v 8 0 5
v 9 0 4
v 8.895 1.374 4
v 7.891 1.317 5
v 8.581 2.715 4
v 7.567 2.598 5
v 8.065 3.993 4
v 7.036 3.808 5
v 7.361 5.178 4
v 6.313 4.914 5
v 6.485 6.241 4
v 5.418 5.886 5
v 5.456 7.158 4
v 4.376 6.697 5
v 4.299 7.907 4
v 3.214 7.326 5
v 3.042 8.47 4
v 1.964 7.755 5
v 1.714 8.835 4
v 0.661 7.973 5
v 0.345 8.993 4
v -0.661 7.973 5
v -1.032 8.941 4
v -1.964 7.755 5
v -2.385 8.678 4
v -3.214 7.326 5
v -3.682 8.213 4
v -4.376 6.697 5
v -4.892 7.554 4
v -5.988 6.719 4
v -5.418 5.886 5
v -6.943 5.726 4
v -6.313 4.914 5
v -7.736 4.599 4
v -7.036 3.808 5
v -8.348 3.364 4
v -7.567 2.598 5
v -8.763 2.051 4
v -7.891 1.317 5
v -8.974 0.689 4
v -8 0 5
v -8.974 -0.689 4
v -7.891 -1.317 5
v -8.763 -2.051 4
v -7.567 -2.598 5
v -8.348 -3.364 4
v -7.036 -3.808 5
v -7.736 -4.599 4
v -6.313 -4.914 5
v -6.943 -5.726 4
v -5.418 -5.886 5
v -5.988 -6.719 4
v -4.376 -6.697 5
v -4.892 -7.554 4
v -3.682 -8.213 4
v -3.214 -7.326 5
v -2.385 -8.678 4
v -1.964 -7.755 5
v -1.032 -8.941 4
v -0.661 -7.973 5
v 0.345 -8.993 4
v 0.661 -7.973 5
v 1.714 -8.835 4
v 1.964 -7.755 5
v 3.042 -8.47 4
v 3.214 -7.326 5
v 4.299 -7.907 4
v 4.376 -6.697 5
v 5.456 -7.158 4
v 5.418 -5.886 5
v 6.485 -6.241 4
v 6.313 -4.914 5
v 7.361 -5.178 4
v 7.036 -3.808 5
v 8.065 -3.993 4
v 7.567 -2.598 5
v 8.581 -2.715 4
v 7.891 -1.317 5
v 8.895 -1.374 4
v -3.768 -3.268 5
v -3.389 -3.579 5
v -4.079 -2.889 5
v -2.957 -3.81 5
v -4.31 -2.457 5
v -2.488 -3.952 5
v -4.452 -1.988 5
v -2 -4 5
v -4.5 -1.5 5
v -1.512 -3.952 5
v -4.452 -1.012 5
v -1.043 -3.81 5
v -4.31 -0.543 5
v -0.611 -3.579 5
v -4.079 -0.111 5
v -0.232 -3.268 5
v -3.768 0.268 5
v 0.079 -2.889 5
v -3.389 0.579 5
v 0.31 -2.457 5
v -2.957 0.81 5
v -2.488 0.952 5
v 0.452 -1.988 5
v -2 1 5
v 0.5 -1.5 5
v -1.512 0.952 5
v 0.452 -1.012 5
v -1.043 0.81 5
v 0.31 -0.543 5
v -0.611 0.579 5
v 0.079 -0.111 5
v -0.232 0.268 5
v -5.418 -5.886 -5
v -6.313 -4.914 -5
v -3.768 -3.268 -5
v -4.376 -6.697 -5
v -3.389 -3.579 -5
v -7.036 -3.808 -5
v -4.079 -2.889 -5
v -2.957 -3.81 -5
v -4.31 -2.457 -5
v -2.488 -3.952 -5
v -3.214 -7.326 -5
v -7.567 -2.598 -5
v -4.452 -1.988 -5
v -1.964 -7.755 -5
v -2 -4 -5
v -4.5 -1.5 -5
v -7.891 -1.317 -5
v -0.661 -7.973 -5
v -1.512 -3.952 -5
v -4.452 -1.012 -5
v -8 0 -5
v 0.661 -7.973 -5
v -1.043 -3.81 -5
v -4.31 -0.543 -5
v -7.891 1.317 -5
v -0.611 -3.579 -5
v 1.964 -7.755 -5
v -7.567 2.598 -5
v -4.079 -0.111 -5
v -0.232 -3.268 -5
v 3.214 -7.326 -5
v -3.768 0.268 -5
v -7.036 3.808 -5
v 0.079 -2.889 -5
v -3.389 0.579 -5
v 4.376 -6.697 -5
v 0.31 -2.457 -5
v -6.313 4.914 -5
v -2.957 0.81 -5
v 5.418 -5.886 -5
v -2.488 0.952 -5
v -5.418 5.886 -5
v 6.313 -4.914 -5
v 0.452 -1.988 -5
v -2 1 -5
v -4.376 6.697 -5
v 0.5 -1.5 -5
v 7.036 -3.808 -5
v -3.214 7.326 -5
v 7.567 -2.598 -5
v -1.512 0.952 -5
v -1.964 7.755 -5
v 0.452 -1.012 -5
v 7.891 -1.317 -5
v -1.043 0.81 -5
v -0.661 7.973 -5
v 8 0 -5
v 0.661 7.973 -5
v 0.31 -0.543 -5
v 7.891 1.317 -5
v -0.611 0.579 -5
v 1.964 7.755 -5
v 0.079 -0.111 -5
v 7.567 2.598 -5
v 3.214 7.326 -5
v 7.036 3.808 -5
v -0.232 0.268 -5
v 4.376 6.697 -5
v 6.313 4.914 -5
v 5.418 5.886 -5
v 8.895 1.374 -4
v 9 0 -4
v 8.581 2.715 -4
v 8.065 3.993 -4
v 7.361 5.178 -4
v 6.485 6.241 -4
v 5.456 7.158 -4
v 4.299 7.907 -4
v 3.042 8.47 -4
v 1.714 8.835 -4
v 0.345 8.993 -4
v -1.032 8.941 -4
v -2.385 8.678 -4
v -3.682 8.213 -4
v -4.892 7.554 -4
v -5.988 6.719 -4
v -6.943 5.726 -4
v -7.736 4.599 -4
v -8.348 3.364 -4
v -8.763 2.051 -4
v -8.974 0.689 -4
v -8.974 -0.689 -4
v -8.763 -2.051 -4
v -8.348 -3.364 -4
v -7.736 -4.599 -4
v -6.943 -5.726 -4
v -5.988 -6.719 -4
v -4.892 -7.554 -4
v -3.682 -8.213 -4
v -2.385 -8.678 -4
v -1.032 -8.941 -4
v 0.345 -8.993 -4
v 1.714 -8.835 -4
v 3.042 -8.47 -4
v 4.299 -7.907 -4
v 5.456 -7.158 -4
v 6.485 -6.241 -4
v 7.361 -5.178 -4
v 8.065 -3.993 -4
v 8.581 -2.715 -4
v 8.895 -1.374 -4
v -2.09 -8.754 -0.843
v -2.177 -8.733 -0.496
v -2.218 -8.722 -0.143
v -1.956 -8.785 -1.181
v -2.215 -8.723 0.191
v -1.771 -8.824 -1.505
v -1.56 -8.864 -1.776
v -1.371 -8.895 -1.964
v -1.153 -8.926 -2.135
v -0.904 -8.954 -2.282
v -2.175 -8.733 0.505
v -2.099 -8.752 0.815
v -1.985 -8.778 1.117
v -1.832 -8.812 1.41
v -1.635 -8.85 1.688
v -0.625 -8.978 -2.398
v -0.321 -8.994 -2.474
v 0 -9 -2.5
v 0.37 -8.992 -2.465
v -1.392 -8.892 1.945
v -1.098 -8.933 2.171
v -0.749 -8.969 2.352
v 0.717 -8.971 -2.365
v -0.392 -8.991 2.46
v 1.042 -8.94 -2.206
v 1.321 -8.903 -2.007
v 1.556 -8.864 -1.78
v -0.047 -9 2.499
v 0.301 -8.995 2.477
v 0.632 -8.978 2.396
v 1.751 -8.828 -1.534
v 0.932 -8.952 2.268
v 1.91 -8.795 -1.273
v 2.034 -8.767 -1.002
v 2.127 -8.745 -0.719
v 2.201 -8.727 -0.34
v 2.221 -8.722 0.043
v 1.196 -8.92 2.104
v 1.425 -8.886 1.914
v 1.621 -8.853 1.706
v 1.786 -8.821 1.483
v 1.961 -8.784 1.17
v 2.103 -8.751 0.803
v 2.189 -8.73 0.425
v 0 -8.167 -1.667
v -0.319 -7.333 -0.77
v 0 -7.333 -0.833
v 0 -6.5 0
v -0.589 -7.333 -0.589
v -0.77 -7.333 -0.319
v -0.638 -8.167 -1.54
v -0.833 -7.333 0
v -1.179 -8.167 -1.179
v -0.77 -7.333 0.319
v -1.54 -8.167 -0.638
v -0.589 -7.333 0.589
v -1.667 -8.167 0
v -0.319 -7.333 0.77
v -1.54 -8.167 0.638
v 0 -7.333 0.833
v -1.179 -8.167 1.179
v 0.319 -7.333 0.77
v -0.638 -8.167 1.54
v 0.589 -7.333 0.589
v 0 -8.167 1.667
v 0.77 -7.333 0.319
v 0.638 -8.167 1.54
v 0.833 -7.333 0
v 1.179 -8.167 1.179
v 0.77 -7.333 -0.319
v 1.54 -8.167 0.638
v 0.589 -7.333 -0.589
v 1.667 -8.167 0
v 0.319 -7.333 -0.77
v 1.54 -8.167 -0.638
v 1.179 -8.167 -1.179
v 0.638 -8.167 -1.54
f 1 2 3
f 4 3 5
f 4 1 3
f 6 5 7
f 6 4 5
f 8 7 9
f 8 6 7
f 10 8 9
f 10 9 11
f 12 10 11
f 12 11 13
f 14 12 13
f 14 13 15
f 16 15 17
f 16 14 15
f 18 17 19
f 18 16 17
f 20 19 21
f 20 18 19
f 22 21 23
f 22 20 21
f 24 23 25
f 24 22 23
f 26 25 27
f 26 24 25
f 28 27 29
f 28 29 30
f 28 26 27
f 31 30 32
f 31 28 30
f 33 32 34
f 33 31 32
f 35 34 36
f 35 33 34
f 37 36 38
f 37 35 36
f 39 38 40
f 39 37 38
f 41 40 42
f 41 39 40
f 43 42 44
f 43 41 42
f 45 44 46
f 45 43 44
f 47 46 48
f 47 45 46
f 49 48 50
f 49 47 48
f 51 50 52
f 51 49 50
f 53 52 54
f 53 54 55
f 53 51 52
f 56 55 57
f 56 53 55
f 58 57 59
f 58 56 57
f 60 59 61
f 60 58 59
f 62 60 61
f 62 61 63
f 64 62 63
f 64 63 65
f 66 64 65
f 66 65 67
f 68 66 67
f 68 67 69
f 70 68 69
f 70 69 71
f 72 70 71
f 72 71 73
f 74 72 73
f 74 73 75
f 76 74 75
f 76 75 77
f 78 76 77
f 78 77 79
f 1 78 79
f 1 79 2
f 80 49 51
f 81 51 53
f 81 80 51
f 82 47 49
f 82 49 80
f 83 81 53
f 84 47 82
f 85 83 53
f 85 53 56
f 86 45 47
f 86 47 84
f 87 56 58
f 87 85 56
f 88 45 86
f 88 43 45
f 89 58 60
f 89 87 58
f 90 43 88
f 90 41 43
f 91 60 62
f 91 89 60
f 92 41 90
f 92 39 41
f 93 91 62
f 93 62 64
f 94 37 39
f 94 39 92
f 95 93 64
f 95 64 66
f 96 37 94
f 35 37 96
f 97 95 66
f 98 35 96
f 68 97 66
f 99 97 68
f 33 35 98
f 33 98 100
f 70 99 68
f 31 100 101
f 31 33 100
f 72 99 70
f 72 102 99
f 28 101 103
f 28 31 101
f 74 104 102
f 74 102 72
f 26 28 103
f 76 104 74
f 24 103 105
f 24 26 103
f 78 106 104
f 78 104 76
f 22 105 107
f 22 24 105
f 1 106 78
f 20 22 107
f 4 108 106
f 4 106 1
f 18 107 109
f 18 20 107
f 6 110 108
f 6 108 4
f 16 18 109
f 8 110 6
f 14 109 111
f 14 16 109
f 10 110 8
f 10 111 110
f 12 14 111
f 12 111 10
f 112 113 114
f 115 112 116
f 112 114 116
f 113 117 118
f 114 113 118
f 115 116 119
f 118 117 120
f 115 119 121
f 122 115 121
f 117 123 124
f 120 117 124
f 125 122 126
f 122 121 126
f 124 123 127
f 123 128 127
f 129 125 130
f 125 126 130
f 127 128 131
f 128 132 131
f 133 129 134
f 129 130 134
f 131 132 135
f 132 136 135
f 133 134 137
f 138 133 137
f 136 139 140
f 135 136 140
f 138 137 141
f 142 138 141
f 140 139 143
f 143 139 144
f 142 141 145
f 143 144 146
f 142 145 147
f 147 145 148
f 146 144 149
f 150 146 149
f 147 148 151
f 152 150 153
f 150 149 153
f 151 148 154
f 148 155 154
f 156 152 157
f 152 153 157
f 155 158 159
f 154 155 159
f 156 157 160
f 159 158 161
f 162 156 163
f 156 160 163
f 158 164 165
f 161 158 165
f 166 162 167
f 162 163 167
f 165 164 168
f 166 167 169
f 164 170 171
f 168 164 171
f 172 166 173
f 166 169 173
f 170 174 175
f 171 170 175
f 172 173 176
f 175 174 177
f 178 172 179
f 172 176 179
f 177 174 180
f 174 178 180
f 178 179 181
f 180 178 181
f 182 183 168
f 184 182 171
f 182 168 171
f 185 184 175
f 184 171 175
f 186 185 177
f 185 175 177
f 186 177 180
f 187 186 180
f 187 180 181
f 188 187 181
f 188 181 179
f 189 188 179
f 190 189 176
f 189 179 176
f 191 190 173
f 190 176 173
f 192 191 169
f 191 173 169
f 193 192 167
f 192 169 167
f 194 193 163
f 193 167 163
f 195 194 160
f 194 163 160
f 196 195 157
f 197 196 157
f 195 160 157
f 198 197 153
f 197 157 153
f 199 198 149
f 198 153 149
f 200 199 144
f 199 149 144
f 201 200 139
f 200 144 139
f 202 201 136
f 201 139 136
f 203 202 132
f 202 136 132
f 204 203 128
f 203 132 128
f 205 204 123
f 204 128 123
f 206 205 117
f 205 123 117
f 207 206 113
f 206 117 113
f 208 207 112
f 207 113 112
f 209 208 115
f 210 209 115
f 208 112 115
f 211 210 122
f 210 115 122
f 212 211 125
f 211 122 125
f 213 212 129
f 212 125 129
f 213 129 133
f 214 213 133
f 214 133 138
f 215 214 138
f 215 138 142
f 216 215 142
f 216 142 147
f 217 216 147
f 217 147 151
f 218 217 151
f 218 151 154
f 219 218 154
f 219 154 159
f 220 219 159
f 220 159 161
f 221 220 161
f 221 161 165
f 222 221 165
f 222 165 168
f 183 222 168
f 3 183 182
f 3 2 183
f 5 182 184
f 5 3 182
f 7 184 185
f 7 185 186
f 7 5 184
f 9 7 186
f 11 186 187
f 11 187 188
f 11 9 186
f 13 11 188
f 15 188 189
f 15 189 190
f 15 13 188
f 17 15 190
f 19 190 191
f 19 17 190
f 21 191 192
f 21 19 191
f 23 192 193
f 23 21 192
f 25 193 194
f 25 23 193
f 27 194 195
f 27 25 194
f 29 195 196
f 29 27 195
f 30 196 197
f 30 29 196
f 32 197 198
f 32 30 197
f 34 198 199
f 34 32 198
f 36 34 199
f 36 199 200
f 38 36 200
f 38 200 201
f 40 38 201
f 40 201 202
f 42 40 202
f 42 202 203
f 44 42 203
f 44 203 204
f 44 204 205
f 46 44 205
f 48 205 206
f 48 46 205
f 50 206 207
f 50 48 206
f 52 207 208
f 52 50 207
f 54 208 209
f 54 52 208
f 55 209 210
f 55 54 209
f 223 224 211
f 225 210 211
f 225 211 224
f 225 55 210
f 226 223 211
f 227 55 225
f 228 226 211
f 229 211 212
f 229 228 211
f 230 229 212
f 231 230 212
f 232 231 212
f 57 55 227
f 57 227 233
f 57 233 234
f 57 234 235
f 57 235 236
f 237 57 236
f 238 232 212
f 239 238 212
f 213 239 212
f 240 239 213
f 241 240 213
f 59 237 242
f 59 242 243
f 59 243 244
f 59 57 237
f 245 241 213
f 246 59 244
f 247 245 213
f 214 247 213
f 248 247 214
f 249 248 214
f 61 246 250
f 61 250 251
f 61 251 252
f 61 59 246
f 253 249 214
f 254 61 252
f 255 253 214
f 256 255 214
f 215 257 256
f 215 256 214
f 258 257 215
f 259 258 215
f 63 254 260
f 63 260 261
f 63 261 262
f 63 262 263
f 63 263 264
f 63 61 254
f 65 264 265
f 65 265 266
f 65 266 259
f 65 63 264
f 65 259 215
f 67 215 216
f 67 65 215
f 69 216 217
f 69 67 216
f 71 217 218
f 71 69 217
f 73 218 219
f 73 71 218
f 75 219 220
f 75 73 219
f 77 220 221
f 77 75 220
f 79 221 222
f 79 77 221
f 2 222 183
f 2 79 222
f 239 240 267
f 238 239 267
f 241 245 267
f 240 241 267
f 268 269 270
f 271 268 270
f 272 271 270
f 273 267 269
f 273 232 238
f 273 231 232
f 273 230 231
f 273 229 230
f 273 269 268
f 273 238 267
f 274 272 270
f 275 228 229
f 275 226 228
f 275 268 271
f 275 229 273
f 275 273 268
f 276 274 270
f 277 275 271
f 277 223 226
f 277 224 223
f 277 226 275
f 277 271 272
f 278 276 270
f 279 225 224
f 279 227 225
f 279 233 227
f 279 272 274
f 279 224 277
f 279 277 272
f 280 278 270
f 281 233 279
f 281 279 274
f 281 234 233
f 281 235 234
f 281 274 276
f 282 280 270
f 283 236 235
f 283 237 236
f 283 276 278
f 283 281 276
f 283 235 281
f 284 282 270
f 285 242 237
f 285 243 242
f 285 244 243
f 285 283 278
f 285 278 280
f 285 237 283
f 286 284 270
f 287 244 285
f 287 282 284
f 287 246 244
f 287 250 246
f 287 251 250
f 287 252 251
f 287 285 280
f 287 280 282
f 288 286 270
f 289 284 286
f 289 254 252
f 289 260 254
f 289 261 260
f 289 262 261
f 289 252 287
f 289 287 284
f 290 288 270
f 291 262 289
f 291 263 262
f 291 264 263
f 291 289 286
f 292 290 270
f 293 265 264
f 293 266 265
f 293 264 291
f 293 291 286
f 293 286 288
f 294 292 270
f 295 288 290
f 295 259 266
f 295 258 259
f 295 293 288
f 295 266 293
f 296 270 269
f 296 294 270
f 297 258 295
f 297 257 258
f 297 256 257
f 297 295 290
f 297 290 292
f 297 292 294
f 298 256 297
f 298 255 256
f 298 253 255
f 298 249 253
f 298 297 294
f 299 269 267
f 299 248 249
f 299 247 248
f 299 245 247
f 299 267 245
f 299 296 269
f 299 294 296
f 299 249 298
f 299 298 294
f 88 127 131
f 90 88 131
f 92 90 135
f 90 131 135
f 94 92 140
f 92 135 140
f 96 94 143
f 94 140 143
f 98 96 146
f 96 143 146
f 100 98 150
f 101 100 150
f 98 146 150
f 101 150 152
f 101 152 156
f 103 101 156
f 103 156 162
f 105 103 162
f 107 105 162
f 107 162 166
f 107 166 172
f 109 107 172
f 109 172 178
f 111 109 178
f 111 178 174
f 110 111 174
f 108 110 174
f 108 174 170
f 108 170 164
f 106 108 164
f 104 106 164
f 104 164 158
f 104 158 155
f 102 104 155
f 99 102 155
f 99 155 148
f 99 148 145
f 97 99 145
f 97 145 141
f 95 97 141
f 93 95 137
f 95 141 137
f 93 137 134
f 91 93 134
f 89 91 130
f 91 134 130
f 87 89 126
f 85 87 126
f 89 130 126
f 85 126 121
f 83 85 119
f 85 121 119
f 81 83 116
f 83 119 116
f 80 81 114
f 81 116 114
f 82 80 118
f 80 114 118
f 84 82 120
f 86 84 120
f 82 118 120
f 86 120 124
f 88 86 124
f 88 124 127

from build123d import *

# Parameters (mm, degrees)
SKETCH_1_R         = 9
EXTRUDE_1_DEPTH    = 5
CHAMFER_1_SIZE     = 1
HOLE_WIZARD_M6_1_D = 5


with BuildPart() as part:
    # 草图1 → 凸台-拉伸1 (new, symmetric)
    with BuildSketch(Plane.XY):
        Circle(SKETCH_1_R)
    extrude(amount=EXTRUDE_1_DEPTH, both=True)

    # 倒角1
    chamfer_1_edges = [part.edges().sort_by_distance(p)[0] for p in [
        (-9, 0, -5),
        (-9, 0, 5),
    ]]
    chamfer(chamfer_1_edges, length=CHAMFER_1_SIZE)

    # M6 螺纹孔1 (through all)
    with Locations(Plane.XY.offset(5)):
        with Locations((-2, -1.5)):
            Hole(HOLE_WIZARD_M6_1_D / 2)

    # 草图5 → 切除-旋转1 (revolve, cut)
    with BuildSketch(Plane(origin=(0, 0, 0), x_dir=(0, 0, -1), z_dir=(1, 0, 0))):
        Polygon((0, -9), (0, -6.5), (2.5, -9), align=None)
    revolve(axis=Axis((0, -9, 0), (0, 1, 0)), mode=Mode.SUBTRACT)


solid = part.part
